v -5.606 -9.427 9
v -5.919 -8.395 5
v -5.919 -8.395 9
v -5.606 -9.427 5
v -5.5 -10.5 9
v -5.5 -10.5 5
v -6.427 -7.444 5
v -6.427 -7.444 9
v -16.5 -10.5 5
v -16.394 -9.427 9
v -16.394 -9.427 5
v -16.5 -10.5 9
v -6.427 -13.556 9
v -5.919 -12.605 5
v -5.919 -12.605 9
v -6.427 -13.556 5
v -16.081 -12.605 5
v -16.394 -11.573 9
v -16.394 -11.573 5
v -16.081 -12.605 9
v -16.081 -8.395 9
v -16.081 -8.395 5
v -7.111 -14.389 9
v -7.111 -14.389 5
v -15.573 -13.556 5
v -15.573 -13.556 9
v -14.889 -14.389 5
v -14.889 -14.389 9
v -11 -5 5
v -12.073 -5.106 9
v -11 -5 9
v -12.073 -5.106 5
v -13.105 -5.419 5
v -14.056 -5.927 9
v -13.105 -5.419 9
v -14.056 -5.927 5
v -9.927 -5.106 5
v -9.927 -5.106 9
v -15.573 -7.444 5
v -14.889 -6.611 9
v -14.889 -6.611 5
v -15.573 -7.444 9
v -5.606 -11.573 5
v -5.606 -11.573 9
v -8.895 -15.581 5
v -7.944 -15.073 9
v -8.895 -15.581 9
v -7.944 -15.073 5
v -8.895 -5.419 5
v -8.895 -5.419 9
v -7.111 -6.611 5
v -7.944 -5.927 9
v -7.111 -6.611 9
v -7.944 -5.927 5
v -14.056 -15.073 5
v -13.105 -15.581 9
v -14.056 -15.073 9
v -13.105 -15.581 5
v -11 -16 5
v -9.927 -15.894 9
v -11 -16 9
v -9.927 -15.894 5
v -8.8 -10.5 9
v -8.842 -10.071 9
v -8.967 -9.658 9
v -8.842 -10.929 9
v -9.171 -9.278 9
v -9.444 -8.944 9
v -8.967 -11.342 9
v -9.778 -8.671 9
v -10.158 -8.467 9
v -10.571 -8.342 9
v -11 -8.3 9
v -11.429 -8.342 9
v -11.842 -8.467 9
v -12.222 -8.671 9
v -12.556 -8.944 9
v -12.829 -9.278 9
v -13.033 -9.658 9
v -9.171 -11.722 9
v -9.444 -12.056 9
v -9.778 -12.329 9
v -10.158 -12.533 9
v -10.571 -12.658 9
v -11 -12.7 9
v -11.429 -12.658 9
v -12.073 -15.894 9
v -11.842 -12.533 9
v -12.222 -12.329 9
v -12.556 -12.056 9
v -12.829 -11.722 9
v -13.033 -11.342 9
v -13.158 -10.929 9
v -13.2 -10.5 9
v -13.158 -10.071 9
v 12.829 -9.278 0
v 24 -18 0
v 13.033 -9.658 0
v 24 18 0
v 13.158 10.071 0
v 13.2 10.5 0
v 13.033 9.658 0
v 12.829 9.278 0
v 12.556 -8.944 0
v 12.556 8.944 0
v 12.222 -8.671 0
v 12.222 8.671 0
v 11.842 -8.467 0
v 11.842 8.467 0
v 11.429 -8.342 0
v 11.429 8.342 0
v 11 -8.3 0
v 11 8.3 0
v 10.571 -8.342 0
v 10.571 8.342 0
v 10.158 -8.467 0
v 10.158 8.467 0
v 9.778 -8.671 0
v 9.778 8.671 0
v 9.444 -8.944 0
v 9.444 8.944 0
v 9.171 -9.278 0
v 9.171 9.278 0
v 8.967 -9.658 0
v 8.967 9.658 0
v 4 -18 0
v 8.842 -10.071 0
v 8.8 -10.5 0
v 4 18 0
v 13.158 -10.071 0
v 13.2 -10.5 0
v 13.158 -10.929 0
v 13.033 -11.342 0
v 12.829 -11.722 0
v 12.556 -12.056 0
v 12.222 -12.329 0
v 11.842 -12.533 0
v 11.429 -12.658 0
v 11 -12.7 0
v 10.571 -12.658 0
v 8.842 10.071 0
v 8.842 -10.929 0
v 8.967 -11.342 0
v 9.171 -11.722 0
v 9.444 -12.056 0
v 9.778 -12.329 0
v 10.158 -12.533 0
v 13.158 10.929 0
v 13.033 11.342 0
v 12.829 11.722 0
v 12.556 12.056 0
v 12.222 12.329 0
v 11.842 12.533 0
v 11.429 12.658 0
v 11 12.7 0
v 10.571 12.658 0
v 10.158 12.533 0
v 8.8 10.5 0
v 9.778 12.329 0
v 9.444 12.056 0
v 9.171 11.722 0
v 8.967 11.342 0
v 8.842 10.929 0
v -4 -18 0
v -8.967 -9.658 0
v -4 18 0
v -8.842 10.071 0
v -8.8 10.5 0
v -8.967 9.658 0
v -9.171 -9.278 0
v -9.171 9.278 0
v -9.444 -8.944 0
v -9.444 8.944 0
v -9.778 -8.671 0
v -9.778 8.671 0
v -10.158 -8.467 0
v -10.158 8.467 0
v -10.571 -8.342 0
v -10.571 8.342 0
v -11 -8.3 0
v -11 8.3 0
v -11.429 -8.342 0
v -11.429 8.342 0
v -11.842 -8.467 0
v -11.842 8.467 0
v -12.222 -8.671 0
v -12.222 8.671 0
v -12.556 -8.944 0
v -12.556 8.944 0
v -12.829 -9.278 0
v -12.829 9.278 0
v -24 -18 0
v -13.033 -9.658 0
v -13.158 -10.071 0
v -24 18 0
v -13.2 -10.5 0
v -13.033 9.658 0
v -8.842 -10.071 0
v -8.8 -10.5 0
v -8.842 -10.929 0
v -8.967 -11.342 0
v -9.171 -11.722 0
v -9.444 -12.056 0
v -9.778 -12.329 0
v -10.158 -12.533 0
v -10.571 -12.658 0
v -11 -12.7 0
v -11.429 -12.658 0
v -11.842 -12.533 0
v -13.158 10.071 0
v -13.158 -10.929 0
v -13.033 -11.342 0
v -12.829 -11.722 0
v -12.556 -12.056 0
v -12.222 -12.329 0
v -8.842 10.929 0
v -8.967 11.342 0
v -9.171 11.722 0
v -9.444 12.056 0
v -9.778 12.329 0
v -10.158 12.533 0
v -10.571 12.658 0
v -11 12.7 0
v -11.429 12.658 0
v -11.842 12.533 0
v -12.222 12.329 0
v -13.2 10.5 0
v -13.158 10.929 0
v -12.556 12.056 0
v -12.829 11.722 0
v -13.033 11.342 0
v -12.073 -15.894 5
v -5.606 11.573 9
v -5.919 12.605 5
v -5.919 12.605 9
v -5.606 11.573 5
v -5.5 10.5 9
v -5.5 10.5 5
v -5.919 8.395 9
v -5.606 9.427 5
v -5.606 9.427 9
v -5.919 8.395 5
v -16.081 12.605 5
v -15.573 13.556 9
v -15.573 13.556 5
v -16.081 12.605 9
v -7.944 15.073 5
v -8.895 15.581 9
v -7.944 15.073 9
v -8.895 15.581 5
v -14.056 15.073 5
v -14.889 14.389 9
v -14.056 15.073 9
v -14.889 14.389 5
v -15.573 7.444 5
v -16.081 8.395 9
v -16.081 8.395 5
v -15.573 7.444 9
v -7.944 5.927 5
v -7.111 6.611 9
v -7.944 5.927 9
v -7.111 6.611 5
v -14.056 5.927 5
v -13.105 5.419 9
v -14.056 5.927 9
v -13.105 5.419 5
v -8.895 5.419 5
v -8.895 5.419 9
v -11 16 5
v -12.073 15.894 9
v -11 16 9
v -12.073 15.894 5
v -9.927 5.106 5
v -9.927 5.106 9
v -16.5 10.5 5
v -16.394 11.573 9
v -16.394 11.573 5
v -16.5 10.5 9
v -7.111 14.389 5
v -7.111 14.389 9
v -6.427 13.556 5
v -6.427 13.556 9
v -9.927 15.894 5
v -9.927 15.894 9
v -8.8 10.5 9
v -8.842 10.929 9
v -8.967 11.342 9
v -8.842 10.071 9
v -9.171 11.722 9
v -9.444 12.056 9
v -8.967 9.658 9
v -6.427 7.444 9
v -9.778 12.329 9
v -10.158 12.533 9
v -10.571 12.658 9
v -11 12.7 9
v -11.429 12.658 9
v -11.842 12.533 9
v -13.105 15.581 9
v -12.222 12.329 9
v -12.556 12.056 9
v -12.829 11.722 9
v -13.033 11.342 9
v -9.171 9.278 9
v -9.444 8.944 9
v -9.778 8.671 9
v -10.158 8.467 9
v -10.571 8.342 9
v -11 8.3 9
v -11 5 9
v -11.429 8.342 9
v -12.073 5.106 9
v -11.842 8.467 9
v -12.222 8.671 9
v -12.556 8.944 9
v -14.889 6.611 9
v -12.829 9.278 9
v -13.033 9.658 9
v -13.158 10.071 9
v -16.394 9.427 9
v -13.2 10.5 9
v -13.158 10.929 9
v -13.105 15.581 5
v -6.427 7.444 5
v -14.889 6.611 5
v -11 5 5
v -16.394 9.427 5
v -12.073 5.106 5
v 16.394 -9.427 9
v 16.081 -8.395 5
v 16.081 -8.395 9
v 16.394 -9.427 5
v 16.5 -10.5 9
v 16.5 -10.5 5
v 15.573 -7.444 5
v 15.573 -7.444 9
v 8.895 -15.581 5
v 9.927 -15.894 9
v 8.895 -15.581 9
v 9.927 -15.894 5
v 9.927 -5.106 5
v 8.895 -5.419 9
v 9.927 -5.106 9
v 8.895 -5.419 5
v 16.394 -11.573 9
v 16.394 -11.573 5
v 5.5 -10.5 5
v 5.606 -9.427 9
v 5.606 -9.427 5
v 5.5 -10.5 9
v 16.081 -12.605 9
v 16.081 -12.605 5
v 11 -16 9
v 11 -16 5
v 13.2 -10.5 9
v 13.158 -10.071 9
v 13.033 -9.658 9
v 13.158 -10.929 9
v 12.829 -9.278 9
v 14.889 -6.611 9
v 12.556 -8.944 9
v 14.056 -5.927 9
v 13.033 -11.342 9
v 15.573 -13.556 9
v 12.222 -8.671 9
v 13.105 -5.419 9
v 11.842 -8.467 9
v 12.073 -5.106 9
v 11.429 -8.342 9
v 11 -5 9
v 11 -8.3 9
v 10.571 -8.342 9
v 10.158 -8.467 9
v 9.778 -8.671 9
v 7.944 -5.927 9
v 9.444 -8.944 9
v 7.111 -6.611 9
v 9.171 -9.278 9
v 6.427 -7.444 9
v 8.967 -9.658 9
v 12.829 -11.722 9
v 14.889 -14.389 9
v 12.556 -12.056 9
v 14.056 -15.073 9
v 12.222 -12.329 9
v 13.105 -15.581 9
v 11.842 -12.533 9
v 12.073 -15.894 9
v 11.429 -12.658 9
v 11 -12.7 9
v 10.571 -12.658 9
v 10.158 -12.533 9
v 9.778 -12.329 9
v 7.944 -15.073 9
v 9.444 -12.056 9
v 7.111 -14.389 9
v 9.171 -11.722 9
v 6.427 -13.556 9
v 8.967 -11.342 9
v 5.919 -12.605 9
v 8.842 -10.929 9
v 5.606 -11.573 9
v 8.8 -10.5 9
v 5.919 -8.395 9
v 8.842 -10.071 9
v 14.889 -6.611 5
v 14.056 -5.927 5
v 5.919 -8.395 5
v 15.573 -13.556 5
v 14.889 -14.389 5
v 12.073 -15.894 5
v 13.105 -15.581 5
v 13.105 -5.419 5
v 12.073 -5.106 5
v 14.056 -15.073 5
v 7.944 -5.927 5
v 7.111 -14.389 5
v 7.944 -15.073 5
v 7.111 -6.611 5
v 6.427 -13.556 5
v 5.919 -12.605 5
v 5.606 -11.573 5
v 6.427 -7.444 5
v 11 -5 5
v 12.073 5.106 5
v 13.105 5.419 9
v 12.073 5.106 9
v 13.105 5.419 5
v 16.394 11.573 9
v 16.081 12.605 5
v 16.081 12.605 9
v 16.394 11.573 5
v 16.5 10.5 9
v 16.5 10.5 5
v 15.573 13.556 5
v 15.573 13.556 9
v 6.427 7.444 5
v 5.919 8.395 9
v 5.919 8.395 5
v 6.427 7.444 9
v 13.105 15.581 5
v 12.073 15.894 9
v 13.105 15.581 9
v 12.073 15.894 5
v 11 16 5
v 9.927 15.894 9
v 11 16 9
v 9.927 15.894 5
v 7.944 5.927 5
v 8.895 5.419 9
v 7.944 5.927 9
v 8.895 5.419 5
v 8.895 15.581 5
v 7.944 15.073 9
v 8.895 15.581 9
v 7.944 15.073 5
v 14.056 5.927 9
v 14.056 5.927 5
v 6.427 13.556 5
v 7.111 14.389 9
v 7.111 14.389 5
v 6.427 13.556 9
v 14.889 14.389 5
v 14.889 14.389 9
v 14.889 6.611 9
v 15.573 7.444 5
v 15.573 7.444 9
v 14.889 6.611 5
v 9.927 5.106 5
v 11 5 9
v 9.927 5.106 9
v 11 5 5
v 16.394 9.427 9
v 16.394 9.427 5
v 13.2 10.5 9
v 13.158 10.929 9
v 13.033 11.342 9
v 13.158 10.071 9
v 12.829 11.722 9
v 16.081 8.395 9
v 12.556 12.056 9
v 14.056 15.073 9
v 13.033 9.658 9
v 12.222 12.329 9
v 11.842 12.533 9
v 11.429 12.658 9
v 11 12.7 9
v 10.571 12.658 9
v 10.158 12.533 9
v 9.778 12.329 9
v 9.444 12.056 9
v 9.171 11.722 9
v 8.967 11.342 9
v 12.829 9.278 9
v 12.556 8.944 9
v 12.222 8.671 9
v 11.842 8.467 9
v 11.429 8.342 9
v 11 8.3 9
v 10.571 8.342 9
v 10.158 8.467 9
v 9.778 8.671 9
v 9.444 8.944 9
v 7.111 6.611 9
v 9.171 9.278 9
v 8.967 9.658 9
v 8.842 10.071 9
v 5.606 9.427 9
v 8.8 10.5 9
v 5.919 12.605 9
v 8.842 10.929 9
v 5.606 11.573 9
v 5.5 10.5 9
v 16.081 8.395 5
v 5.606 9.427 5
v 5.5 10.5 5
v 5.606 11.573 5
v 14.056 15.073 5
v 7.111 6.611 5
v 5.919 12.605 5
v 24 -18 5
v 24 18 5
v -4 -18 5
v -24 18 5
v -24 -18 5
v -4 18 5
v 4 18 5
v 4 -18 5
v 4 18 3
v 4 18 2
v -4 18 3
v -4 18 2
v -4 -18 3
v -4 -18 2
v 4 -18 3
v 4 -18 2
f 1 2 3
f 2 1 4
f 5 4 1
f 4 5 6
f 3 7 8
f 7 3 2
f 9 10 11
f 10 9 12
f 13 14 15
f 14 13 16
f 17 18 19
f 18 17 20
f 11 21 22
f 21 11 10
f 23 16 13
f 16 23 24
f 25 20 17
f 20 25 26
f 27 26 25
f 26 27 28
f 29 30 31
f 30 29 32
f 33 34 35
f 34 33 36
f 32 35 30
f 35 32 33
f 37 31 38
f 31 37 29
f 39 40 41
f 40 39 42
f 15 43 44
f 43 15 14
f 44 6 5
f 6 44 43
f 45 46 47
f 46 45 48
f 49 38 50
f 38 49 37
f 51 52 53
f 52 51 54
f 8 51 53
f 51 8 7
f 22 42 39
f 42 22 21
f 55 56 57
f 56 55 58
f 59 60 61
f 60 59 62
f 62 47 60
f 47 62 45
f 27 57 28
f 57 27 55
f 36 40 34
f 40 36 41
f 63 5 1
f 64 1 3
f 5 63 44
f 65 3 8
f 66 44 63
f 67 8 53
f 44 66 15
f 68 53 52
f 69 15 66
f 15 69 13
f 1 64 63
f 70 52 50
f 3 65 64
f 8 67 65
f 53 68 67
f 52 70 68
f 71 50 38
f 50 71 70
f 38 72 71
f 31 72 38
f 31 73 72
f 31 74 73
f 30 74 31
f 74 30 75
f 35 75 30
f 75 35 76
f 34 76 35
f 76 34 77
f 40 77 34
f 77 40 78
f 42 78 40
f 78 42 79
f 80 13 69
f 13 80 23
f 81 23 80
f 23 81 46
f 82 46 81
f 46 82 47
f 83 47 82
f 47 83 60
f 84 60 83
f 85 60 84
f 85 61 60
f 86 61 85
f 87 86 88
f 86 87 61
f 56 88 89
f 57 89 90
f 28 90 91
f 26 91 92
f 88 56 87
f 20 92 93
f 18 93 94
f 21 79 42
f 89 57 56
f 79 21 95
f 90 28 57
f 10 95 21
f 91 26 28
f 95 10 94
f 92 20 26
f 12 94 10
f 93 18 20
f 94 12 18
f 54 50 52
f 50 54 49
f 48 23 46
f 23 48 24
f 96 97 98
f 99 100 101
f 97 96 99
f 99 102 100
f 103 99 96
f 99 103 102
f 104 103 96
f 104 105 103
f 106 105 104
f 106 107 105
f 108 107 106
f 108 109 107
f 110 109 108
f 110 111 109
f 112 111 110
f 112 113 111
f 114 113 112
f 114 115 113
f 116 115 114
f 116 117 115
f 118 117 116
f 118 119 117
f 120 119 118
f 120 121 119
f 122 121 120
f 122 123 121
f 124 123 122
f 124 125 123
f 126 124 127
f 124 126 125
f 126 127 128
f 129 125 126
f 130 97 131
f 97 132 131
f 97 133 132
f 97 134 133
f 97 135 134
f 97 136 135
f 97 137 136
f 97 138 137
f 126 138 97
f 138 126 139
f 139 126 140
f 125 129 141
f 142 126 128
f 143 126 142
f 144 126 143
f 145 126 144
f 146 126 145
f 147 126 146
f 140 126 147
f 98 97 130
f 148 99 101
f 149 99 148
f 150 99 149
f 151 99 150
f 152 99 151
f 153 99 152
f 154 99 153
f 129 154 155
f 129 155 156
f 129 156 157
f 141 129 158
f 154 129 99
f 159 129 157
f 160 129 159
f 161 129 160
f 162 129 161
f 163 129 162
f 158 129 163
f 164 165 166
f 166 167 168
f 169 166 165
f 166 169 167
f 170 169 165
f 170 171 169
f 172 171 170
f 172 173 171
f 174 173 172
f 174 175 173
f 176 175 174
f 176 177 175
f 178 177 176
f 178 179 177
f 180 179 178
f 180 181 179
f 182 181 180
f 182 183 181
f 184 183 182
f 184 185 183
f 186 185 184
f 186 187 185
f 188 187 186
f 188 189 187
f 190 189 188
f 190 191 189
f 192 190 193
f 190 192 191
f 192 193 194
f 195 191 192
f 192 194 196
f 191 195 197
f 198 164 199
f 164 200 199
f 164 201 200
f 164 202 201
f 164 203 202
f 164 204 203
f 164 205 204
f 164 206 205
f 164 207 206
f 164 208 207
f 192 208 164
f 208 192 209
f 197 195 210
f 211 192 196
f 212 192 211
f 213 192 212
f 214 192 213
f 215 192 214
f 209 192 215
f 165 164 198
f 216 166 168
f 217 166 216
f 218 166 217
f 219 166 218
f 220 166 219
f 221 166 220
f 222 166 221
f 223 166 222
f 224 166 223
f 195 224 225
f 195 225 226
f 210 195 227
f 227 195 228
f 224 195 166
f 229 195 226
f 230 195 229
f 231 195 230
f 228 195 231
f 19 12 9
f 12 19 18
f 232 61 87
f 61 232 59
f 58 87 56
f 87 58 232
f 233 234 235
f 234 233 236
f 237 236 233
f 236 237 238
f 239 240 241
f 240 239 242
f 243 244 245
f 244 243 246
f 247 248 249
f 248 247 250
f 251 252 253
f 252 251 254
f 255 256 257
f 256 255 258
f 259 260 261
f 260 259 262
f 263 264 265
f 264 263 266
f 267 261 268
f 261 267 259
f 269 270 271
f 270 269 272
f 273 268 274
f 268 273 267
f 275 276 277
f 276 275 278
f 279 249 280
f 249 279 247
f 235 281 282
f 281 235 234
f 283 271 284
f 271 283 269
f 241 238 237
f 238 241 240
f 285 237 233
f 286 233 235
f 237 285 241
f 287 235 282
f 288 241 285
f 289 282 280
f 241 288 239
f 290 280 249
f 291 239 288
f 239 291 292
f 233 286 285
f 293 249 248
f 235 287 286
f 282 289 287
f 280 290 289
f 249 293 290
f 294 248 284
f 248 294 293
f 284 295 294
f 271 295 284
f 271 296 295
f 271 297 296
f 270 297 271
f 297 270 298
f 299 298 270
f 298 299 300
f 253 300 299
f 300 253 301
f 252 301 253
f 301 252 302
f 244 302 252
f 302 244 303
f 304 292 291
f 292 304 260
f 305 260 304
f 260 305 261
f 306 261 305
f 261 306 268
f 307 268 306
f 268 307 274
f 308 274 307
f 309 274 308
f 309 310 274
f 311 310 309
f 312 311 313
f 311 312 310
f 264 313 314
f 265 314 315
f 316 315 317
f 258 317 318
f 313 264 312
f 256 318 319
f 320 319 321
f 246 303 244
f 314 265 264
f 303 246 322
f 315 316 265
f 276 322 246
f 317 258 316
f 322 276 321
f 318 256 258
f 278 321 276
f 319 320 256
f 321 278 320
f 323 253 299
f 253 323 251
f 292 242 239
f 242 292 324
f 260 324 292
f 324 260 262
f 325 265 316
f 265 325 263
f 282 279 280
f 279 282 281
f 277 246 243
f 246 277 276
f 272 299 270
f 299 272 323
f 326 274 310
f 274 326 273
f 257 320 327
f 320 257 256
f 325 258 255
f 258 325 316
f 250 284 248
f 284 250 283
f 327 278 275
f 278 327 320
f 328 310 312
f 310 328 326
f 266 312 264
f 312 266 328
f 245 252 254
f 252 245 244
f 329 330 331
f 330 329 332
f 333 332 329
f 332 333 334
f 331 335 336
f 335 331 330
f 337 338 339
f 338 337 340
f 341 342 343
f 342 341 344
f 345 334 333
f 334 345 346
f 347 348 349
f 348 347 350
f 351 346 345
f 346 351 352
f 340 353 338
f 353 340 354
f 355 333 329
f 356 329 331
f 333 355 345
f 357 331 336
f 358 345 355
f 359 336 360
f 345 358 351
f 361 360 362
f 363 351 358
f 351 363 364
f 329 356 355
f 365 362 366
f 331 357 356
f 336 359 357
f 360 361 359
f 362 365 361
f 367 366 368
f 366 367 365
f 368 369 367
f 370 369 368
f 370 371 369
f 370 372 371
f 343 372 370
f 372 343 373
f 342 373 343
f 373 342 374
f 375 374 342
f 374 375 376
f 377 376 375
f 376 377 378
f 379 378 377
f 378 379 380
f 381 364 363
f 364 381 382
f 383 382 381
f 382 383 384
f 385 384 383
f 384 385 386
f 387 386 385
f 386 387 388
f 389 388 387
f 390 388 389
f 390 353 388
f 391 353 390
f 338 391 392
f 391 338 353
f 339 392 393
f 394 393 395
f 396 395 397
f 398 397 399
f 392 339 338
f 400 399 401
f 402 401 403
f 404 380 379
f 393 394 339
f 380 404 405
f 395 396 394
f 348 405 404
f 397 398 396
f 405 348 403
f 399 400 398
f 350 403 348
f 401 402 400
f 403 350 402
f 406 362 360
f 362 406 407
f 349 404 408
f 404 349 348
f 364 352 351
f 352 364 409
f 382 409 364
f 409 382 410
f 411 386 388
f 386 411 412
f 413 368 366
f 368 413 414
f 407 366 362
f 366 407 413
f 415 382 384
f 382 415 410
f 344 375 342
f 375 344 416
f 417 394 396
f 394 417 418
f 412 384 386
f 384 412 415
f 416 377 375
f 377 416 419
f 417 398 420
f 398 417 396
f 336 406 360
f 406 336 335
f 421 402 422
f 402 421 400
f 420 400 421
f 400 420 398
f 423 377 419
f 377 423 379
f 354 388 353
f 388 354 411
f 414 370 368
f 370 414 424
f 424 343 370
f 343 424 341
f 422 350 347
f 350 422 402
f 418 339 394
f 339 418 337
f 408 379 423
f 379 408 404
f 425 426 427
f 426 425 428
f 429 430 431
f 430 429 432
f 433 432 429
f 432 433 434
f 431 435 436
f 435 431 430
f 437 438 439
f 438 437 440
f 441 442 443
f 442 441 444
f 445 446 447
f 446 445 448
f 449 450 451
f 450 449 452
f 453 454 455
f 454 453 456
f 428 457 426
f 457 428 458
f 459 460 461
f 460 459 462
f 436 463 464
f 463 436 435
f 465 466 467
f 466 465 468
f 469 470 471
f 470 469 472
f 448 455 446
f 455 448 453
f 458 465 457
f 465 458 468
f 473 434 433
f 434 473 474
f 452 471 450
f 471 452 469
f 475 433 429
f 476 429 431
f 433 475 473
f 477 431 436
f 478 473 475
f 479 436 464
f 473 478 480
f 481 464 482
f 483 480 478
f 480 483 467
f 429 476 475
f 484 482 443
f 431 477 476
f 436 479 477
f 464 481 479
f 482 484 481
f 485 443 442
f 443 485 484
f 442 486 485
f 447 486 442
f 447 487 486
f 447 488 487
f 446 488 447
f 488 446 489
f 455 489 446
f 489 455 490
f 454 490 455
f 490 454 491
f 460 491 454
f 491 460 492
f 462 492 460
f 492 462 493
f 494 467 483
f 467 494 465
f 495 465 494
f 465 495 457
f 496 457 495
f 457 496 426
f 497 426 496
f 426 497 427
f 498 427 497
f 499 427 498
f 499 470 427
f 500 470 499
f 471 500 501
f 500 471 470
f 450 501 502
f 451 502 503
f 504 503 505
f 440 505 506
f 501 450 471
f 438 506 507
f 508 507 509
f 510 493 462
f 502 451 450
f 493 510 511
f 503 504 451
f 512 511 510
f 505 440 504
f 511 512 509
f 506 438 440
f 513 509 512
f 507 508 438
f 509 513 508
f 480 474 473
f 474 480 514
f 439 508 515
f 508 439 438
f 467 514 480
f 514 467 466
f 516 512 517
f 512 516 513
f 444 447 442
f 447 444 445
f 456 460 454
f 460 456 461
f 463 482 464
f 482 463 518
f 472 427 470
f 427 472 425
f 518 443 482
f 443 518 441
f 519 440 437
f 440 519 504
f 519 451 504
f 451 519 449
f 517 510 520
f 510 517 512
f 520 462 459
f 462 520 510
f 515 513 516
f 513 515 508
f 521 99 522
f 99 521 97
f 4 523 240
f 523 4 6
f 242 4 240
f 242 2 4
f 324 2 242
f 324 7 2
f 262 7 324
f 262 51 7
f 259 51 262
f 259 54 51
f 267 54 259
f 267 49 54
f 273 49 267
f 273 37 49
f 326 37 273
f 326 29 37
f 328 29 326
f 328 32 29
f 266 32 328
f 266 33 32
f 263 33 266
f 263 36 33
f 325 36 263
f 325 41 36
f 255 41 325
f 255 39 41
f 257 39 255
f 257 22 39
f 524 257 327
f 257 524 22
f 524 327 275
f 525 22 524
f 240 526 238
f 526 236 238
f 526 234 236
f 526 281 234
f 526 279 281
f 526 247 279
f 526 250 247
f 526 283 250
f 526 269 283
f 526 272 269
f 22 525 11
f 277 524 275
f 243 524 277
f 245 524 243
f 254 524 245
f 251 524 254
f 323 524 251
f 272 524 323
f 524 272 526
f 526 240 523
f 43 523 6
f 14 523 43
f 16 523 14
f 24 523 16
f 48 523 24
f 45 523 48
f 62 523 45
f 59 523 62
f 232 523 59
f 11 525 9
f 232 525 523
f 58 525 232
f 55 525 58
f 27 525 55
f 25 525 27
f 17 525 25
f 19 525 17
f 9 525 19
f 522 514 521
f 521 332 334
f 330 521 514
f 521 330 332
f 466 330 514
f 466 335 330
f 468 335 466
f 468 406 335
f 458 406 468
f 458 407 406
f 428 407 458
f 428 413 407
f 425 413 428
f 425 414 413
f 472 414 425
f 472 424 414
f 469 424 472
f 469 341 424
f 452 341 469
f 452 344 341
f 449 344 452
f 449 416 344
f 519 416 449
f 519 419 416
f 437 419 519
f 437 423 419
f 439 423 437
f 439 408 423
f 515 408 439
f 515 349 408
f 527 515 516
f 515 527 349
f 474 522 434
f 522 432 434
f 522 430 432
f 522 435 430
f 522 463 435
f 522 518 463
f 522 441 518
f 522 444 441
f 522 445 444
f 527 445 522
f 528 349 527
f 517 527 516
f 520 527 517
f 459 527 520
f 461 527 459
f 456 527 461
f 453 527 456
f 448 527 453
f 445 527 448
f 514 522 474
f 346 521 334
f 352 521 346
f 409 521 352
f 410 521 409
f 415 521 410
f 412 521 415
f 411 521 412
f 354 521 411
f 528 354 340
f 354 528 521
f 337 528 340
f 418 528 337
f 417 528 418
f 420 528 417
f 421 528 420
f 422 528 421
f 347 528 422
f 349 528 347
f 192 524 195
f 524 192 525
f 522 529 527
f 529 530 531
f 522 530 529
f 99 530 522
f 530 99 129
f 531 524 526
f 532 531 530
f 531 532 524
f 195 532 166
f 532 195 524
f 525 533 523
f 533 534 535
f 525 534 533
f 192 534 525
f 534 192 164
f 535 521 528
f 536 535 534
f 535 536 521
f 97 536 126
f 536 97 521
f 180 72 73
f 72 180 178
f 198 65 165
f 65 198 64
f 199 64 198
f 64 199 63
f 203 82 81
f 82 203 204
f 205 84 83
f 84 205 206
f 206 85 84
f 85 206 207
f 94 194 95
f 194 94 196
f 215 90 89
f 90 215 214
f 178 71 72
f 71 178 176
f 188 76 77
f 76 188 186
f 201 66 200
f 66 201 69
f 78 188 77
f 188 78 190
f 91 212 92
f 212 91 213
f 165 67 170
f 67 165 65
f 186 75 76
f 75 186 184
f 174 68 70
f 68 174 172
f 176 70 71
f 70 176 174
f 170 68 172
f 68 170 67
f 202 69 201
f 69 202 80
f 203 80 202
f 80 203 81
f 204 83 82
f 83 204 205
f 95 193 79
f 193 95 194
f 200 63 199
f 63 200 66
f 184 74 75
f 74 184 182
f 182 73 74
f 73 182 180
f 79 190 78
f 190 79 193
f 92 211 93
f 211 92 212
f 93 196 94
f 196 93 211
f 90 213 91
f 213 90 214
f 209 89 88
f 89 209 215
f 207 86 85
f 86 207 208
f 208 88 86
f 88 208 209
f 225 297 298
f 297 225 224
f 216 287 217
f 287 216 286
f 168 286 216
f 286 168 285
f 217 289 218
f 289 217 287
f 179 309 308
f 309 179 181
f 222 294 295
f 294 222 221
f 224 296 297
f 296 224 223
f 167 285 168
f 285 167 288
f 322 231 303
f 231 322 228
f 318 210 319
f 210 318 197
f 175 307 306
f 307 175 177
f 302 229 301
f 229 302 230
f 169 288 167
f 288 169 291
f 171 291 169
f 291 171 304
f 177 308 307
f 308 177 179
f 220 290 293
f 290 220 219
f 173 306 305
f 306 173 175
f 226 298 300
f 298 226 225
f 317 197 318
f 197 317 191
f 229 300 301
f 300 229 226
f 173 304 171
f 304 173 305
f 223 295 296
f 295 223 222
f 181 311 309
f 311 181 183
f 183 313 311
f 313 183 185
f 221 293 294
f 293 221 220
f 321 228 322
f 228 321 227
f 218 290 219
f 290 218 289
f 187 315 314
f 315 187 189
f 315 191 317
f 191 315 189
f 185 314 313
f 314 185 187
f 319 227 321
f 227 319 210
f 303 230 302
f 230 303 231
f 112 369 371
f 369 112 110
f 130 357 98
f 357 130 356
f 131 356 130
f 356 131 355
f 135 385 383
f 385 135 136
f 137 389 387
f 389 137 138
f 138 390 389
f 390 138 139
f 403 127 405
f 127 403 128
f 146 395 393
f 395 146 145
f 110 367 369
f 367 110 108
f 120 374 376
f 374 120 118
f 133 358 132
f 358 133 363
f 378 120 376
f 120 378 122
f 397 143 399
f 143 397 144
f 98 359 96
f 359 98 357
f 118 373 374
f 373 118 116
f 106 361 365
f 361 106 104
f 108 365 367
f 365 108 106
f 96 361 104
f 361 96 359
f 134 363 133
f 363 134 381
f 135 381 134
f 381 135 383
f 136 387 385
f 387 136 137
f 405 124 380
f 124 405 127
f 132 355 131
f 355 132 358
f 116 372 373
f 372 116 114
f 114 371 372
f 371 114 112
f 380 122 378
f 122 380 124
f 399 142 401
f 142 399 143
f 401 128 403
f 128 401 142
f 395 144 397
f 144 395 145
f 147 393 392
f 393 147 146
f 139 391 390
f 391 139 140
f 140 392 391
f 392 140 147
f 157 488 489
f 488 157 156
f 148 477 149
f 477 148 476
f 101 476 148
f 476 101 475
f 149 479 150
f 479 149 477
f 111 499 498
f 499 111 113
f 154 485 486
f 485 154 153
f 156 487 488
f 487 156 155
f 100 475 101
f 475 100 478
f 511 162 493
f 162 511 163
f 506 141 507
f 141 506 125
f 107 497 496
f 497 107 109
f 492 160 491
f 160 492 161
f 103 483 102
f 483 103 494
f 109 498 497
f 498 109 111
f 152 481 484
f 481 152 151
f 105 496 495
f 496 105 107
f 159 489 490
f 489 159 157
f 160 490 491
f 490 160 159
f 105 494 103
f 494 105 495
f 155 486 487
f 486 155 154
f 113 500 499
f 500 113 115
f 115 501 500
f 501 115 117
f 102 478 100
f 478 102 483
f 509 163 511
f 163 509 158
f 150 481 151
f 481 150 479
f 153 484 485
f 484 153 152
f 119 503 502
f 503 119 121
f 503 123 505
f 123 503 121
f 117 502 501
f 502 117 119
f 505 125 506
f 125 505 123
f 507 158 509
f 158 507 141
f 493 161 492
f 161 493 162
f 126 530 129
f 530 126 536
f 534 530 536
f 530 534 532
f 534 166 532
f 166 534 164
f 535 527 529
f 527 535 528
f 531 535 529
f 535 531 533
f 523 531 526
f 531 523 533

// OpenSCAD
$fn = 32;

// ----------------------------------------------------------------------
// Living hinge: 48 x 36 mm plates, 1 mm flexible web
// ----------------------------------------------------------------------

// --- parameters (mm) ---
plate_len = 20;           // plate length outside the web
plate_w = 36;             // plate width
thick = 5;                // plate thickness
web_half = 4;             // half width of the flex band
web_t = 1;                // flexible web thickness
web_z = 2;                // web position inside the thickness
boss_d = 11;              // screw boss diameter
boss_h = 9;               // screw boss height
boss_x = 11;              // screw boss distance from the web
screw_d = 4.4;            // screw hole

difference() {
  union() {
    /* one flat strip, later thinned at the middle */
    translate([-24, -18, 0]) cube([48, 36, 5]);
    /* screw bosses, sunk 0.5 mm into the plates */
    for (sx = [-11, 11]) {
      for (sy = [-10.5, 10.5]) {
        translate([sx, sy, 0]) cylinder(h = boss_h, d = boss_d);
      }
    }
  }
  /* channel from below: leaves the web on top of it */
  translate([-4, -20.5, -2.5]) cube([8, 41, 4.5]);
  /* channel from above: thins the web down to web_t */
  translate([-4, -20.5, 3]) cube([8, 41, 4.5]);
  /* screw holes through the bosses */
  for (sx = [-11, 11]) {
    for (sy = [-10.5, 10.5]) {
      translate([sx, sy, -2.5]) cylinder(h = boss_h + 5, d = screw_d);
    }
  }
}
